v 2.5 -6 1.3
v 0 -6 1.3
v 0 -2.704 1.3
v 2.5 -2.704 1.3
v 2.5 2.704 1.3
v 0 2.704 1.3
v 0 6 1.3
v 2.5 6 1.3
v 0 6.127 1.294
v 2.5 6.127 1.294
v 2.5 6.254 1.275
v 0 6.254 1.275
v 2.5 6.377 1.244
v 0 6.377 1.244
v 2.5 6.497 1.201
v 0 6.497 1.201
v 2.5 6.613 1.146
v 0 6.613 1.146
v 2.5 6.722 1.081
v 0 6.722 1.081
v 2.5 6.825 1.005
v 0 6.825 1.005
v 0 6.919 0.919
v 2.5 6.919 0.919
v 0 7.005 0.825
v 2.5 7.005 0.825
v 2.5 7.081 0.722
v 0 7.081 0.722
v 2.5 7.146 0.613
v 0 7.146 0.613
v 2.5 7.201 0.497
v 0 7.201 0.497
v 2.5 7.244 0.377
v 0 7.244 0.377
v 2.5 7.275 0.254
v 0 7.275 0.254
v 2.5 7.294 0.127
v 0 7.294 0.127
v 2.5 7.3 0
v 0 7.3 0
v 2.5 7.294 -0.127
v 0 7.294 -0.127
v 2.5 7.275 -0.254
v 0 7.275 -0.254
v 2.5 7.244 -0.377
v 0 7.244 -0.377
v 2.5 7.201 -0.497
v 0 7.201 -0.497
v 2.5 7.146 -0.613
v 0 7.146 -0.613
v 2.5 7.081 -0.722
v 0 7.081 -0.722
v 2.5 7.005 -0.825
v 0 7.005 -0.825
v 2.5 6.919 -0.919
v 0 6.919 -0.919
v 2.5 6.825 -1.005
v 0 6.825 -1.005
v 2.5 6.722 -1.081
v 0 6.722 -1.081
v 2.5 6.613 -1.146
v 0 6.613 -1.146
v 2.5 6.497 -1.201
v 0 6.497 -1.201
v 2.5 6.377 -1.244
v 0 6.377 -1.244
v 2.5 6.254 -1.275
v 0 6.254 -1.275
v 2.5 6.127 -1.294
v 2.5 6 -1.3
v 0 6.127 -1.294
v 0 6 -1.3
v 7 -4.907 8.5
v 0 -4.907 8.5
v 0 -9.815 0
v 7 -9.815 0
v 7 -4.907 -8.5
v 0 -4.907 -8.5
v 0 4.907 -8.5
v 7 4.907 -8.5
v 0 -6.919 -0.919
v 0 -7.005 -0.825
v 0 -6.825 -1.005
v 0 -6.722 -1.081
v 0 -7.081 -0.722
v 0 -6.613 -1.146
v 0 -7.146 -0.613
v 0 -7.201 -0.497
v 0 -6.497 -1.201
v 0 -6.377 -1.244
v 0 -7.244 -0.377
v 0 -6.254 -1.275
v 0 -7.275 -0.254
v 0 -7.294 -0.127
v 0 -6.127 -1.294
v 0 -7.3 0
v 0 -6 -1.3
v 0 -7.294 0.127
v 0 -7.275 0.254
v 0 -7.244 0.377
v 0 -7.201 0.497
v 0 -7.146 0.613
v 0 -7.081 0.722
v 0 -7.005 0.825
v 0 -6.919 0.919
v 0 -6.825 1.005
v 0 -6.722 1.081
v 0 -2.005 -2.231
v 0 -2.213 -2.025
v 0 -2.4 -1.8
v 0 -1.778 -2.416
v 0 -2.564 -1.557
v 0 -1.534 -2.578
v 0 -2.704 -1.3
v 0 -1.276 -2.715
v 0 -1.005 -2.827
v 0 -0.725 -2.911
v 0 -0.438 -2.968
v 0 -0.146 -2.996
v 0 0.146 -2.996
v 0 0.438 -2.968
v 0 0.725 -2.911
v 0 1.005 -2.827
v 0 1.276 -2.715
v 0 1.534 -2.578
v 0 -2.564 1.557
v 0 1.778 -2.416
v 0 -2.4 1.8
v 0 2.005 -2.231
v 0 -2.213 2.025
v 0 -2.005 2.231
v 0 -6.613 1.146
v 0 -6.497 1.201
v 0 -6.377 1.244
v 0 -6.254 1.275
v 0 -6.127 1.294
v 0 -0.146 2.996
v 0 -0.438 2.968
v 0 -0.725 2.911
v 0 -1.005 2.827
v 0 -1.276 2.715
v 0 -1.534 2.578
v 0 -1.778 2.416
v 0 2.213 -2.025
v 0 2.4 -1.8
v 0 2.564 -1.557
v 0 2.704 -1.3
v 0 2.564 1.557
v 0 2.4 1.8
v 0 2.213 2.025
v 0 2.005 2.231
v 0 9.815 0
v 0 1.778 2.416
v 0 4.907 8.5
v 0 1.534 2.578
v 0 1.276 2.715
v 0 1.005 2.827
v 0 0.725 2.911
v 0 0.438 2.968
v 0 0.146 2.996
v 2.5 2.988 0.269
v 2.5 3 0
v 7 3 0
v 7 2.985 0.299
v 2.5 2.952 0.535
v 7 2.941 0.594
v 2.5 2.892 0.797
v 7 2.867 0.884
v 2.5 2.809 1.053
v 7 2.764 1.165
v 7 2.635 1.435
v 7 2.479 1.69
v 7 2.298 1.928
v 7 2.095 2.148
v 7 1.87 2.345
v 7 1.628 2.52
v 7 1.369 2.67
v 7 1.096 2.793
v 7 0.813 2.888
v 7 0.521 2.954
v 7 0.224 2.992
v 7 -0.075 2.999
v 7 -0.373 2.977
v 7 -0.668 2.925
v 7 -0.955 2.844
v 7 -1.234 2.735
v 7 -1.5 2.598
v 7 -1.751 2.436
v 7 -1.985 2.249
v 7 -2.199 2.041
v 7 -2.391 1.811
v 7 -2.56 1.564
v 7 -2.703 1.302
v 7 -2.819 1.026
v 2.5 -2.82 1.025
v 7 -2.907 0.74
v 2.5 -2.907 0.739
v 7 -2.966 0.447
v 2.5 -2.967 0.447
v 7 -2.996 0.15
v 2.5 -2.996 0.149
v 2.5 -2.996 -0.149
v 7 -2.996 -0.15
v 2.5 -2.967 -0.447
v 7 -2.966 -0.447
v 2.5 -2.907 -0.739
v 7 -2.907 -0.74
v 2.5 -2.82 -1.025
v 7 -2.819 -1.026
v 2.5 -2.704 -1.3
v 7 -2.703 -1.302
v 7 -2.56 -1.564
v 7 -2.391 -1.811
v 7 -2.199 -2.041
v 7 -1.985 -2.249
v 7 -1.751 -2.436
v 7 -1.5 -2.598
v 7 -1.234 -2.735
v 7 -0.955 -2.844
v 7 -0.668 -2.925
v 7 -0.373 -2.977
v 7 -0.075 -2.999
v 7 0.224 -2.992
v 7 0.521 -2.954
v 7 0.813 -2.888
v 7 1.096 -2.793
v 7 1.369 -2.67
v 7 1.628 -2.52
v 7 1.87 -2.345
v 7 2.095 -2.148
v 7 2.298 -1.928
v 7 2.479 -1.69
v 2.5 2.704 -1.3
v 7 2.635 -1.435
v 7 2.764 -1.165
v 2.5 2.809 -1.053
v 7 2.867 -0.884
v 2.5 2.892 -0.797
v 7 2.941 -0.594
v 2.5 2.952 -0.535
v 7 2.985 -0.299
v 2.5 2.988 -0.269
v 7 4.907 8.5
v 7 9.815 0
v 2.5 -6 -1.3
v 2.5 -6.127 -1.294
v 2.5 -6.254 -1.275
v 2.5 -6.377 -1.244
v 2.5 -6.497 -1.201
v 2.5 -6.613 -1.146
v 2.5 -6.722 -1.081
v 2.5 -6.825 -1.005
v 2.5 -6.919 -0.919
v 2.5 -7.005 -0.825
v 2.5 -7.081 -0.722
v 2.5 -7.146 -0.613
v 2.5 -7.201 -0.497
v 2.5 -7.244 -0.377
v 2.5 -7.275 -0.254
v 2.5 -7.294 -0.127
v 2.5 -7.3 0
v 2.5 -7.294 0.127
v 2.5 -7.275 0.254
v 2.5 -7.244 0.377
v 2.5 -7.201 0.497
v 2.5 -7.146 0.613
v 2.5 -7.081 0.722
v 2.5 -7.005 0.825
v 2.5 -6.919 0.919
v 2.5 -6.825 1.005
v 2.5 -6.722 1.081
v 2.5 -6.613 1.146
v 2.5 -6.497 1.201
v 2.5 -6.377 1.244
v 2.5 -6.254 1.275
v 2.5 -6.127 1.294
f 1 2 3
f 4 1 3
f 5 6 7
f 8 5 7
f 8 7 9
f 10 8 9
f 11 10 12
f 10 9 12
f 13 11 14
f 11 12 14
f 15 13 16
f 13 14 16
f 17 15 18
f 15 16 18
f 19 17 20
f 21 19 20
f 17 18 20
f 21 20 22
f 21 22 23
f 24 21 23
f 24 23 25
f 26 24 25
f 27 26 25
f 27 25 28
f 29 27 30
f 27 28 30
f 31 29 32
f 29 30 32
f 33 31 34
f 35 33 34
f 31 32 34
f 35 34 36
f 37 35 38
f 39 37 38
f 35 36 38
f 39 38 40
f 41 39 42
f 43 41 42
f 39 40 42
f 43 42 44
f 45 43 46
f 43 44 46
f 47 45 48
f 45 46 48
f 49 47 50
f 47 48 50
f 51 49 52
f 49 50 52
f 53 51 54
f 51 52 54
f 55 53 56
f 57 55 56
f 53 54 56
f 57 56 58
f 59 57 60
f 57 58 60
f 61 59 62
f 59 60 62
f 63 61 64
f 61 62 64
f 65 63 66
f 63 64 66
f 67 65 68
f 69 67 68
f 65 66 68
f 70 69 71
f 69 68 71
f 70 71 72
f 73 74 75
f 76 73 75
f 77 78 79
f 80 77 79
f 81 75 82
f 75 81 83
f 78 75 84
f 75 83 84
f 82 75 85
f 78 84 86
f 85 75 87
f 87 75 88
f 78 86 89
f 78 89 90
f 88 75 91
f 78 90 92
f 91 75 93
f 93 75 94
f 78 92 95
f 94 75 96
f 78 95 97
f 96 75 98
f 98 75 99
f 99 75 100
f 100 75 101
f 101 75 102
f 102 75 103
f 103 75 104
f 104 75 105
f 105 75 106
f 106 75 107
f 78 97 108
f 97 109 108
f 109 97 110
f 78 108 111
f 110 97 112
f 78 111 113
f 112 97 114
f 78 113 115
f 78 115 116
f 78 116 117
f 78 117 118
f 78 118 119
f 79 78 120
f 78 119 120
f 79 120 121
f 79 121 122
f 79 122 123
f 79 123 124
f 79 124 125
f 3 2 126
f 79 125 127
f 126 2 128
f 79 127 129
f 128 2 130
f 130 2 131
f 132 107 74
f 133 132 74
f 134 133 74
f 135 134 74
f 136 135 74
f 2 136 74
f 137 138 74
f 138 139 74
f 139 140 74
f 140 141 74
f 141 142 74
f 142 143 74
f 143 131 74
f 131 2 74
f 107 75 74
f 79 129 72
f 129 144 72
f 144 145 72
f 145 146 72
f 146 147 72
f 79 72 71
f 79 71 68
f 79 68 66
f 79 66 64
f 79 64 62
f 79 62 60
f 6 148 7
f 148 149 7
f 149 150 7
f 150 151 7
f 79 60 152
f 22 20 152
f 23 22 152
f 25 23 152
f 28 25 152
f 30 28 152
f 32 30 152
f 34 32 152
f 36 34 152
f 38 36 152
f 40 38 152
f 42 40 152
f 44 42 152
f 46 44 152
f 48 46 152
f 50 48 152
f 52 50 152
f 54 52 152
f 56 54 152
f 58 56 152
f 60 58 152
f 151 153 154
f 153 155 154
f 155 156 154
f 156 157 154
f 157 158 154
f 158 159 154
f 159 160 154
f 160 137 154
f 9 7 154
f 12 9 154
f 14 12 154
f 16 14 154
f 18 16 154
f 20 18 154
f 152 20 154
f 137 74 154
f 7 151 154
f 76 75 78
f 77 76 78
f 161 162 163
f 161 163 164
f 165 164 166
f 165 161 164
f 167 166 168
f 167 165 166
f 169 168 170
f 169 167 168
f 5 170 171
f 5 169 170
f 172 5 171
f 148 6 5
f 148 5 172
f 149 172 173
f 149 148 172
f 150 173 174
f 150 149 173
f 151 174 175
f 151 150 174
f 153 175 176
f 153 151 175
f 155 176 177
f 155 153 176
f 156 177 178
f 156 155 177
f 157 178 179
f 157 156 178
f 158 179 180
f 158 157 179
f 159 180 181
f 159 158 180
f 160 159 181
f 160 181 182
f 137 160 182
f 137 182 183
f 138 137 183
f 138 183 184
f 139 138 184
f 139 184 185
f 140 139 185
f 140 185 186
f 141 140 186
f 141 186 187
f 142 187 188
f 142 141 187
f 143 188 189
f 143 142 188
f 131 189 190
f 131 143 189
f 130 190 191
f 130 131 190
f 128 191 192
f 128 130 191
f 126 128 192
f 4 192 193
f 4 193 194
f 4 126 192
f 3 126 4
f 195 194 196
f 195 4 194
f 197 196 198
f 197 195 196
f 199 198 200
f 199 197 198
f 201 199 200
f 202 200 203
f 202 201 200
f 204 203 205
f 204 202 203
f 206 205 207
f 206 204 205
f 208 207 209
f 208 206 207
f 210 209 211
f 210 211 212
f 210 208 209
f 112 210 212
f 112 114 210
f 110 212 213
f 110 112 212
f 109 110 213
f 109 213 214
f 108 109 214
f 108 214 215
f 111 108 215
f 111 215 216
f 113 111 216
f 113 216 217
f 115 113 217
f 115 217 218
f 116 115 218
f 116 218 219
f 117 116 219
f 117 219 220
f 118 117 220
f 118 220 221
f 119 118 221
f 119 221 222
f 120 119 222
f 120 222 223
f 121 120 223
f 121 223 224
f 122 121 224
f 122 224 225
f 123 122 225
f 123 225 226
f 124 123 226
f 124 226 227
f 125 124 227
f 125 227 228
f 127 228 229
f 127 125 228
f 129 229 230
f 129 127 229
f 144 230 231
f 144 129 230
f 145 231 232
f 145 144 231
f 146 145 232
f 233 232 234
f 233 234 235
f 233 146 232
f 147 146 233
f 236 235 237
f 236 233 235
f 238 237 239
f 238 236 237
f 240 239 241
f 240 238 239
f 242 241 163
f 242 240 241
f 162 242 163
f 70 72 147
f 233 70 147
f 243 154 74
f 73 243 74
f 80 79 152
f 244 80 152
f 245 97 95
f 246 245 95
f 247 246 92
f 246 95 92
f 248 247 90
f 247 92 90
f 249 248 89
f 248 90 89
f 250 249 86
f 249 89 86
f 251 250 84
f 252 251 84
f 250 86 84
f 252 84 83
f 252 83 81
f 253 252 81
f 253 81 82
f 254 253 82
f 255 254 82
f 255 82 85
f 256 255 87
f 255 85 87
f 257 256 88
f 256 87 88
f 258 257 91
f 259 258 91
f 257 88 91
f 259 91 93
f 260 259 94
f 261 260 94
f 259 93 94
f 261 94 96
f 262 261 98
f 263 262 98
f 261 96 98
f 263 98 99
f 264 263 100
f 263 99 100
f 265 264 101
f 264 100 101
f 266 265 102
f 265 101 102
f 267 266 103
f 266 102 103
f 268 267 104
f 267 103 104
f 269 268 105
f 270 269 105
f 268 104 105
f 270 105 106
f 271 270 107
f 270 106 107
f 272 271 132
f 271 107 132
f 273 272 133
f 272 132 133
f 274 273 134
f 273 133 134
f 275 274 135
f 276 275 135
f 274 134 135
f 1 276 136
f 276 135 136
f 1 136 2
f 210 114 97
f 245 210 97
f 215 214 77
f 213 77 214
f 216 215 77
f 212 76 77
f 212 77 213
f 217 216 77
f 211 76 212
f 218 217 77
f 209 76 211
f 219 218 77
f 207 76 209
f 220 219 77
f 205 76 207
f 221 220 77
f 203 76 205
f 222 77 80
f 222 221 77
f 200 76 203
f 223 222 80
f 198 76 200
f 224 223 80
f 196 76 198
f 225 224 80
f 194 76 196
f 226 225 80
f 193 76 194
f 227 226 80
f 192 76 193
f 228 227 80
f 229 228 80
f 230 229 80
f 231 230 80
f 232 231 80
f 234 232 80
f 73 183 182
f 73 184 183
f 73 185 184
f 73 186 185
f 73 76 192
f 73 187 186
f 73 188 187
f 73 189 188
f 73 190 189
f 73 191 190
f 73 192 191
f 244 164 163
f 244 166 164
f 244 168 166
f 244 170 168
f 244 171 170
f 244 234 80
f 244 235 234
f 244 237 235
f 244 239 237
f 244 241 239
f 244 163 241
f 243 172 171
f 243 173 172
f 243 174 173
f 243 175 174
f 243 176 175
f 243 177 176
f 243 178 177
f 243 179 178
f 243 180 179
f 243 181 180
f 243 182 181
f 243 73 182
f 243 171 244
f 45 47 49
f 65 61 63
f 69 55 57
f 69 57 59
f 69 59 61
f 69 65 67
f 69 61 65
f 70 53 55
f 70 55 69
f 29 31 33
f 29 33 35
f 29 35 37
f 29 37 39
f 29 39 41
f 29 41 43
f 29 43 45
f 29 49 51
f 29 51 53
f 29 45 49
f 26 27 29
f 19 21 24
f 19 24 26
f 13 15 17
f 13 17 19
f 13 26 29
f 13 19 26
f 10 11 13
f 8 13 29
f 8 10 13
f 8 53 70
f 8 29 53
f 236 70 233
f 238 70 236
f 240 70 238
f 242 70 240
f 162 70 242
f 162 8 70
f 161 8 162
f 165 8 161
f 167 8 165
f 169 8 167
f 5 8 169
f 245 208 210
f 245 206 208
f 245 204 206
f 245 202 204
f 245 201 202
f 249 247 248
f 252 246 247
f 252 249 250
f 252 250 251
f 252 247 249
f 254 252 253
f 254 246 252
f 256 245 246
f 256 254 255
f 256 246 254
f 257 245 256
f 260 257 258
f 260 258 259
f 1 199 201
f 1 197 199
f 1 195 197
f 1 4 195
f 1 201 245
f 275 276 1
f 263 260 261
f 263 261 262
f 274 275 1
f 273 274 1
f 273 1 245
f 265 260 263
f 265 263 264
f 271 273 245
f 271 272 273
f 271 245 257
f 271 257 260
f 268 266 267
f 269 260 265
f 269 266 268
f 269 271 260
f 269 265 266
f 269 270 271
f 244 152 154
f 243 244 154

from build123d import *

# Parameters (mm, degrees)
F0_R     = 3
F1_DEPTH = 7
F3_DEPTH = 2.5


with BuildPart() as f1:
    # F0 (on Right) → F1 (new body)
    with BuildSketch(Plane.YZ):
        Polygon((4.907477, 8.5), (-4.907477, 8.5), (-9.814955, 0), (-4.907477, -8.5), (4.907477, -8.5), (9.814955, 0), align=None)
        Circle(F0_R, mode=Mode.SUBTRACT)
    extrude(amount=F1_DEPTH)

    # F2 (on face) → F3 (cut)
    with BuildSketch(Plane(origin=(0, 0, 0), x_dir=(0, -1, 0), z_dir=(-1, 0, 0))):
        with BuildLine():
            Line((6, 1.3), (-6, 1.3))
            ThreePointArc((-6, 1.3), (-7.3, 0), (-6, -1.3))
            Line((-6, -1.3), (6, -1.3))
            ThreePointArc((6, -1.3), (7.3, 0), (6, 1.3))
        make_face()
    extrude(amount=-F3_DEPTH, mode=Mode.SUBTRACT)


solid = f1.part
